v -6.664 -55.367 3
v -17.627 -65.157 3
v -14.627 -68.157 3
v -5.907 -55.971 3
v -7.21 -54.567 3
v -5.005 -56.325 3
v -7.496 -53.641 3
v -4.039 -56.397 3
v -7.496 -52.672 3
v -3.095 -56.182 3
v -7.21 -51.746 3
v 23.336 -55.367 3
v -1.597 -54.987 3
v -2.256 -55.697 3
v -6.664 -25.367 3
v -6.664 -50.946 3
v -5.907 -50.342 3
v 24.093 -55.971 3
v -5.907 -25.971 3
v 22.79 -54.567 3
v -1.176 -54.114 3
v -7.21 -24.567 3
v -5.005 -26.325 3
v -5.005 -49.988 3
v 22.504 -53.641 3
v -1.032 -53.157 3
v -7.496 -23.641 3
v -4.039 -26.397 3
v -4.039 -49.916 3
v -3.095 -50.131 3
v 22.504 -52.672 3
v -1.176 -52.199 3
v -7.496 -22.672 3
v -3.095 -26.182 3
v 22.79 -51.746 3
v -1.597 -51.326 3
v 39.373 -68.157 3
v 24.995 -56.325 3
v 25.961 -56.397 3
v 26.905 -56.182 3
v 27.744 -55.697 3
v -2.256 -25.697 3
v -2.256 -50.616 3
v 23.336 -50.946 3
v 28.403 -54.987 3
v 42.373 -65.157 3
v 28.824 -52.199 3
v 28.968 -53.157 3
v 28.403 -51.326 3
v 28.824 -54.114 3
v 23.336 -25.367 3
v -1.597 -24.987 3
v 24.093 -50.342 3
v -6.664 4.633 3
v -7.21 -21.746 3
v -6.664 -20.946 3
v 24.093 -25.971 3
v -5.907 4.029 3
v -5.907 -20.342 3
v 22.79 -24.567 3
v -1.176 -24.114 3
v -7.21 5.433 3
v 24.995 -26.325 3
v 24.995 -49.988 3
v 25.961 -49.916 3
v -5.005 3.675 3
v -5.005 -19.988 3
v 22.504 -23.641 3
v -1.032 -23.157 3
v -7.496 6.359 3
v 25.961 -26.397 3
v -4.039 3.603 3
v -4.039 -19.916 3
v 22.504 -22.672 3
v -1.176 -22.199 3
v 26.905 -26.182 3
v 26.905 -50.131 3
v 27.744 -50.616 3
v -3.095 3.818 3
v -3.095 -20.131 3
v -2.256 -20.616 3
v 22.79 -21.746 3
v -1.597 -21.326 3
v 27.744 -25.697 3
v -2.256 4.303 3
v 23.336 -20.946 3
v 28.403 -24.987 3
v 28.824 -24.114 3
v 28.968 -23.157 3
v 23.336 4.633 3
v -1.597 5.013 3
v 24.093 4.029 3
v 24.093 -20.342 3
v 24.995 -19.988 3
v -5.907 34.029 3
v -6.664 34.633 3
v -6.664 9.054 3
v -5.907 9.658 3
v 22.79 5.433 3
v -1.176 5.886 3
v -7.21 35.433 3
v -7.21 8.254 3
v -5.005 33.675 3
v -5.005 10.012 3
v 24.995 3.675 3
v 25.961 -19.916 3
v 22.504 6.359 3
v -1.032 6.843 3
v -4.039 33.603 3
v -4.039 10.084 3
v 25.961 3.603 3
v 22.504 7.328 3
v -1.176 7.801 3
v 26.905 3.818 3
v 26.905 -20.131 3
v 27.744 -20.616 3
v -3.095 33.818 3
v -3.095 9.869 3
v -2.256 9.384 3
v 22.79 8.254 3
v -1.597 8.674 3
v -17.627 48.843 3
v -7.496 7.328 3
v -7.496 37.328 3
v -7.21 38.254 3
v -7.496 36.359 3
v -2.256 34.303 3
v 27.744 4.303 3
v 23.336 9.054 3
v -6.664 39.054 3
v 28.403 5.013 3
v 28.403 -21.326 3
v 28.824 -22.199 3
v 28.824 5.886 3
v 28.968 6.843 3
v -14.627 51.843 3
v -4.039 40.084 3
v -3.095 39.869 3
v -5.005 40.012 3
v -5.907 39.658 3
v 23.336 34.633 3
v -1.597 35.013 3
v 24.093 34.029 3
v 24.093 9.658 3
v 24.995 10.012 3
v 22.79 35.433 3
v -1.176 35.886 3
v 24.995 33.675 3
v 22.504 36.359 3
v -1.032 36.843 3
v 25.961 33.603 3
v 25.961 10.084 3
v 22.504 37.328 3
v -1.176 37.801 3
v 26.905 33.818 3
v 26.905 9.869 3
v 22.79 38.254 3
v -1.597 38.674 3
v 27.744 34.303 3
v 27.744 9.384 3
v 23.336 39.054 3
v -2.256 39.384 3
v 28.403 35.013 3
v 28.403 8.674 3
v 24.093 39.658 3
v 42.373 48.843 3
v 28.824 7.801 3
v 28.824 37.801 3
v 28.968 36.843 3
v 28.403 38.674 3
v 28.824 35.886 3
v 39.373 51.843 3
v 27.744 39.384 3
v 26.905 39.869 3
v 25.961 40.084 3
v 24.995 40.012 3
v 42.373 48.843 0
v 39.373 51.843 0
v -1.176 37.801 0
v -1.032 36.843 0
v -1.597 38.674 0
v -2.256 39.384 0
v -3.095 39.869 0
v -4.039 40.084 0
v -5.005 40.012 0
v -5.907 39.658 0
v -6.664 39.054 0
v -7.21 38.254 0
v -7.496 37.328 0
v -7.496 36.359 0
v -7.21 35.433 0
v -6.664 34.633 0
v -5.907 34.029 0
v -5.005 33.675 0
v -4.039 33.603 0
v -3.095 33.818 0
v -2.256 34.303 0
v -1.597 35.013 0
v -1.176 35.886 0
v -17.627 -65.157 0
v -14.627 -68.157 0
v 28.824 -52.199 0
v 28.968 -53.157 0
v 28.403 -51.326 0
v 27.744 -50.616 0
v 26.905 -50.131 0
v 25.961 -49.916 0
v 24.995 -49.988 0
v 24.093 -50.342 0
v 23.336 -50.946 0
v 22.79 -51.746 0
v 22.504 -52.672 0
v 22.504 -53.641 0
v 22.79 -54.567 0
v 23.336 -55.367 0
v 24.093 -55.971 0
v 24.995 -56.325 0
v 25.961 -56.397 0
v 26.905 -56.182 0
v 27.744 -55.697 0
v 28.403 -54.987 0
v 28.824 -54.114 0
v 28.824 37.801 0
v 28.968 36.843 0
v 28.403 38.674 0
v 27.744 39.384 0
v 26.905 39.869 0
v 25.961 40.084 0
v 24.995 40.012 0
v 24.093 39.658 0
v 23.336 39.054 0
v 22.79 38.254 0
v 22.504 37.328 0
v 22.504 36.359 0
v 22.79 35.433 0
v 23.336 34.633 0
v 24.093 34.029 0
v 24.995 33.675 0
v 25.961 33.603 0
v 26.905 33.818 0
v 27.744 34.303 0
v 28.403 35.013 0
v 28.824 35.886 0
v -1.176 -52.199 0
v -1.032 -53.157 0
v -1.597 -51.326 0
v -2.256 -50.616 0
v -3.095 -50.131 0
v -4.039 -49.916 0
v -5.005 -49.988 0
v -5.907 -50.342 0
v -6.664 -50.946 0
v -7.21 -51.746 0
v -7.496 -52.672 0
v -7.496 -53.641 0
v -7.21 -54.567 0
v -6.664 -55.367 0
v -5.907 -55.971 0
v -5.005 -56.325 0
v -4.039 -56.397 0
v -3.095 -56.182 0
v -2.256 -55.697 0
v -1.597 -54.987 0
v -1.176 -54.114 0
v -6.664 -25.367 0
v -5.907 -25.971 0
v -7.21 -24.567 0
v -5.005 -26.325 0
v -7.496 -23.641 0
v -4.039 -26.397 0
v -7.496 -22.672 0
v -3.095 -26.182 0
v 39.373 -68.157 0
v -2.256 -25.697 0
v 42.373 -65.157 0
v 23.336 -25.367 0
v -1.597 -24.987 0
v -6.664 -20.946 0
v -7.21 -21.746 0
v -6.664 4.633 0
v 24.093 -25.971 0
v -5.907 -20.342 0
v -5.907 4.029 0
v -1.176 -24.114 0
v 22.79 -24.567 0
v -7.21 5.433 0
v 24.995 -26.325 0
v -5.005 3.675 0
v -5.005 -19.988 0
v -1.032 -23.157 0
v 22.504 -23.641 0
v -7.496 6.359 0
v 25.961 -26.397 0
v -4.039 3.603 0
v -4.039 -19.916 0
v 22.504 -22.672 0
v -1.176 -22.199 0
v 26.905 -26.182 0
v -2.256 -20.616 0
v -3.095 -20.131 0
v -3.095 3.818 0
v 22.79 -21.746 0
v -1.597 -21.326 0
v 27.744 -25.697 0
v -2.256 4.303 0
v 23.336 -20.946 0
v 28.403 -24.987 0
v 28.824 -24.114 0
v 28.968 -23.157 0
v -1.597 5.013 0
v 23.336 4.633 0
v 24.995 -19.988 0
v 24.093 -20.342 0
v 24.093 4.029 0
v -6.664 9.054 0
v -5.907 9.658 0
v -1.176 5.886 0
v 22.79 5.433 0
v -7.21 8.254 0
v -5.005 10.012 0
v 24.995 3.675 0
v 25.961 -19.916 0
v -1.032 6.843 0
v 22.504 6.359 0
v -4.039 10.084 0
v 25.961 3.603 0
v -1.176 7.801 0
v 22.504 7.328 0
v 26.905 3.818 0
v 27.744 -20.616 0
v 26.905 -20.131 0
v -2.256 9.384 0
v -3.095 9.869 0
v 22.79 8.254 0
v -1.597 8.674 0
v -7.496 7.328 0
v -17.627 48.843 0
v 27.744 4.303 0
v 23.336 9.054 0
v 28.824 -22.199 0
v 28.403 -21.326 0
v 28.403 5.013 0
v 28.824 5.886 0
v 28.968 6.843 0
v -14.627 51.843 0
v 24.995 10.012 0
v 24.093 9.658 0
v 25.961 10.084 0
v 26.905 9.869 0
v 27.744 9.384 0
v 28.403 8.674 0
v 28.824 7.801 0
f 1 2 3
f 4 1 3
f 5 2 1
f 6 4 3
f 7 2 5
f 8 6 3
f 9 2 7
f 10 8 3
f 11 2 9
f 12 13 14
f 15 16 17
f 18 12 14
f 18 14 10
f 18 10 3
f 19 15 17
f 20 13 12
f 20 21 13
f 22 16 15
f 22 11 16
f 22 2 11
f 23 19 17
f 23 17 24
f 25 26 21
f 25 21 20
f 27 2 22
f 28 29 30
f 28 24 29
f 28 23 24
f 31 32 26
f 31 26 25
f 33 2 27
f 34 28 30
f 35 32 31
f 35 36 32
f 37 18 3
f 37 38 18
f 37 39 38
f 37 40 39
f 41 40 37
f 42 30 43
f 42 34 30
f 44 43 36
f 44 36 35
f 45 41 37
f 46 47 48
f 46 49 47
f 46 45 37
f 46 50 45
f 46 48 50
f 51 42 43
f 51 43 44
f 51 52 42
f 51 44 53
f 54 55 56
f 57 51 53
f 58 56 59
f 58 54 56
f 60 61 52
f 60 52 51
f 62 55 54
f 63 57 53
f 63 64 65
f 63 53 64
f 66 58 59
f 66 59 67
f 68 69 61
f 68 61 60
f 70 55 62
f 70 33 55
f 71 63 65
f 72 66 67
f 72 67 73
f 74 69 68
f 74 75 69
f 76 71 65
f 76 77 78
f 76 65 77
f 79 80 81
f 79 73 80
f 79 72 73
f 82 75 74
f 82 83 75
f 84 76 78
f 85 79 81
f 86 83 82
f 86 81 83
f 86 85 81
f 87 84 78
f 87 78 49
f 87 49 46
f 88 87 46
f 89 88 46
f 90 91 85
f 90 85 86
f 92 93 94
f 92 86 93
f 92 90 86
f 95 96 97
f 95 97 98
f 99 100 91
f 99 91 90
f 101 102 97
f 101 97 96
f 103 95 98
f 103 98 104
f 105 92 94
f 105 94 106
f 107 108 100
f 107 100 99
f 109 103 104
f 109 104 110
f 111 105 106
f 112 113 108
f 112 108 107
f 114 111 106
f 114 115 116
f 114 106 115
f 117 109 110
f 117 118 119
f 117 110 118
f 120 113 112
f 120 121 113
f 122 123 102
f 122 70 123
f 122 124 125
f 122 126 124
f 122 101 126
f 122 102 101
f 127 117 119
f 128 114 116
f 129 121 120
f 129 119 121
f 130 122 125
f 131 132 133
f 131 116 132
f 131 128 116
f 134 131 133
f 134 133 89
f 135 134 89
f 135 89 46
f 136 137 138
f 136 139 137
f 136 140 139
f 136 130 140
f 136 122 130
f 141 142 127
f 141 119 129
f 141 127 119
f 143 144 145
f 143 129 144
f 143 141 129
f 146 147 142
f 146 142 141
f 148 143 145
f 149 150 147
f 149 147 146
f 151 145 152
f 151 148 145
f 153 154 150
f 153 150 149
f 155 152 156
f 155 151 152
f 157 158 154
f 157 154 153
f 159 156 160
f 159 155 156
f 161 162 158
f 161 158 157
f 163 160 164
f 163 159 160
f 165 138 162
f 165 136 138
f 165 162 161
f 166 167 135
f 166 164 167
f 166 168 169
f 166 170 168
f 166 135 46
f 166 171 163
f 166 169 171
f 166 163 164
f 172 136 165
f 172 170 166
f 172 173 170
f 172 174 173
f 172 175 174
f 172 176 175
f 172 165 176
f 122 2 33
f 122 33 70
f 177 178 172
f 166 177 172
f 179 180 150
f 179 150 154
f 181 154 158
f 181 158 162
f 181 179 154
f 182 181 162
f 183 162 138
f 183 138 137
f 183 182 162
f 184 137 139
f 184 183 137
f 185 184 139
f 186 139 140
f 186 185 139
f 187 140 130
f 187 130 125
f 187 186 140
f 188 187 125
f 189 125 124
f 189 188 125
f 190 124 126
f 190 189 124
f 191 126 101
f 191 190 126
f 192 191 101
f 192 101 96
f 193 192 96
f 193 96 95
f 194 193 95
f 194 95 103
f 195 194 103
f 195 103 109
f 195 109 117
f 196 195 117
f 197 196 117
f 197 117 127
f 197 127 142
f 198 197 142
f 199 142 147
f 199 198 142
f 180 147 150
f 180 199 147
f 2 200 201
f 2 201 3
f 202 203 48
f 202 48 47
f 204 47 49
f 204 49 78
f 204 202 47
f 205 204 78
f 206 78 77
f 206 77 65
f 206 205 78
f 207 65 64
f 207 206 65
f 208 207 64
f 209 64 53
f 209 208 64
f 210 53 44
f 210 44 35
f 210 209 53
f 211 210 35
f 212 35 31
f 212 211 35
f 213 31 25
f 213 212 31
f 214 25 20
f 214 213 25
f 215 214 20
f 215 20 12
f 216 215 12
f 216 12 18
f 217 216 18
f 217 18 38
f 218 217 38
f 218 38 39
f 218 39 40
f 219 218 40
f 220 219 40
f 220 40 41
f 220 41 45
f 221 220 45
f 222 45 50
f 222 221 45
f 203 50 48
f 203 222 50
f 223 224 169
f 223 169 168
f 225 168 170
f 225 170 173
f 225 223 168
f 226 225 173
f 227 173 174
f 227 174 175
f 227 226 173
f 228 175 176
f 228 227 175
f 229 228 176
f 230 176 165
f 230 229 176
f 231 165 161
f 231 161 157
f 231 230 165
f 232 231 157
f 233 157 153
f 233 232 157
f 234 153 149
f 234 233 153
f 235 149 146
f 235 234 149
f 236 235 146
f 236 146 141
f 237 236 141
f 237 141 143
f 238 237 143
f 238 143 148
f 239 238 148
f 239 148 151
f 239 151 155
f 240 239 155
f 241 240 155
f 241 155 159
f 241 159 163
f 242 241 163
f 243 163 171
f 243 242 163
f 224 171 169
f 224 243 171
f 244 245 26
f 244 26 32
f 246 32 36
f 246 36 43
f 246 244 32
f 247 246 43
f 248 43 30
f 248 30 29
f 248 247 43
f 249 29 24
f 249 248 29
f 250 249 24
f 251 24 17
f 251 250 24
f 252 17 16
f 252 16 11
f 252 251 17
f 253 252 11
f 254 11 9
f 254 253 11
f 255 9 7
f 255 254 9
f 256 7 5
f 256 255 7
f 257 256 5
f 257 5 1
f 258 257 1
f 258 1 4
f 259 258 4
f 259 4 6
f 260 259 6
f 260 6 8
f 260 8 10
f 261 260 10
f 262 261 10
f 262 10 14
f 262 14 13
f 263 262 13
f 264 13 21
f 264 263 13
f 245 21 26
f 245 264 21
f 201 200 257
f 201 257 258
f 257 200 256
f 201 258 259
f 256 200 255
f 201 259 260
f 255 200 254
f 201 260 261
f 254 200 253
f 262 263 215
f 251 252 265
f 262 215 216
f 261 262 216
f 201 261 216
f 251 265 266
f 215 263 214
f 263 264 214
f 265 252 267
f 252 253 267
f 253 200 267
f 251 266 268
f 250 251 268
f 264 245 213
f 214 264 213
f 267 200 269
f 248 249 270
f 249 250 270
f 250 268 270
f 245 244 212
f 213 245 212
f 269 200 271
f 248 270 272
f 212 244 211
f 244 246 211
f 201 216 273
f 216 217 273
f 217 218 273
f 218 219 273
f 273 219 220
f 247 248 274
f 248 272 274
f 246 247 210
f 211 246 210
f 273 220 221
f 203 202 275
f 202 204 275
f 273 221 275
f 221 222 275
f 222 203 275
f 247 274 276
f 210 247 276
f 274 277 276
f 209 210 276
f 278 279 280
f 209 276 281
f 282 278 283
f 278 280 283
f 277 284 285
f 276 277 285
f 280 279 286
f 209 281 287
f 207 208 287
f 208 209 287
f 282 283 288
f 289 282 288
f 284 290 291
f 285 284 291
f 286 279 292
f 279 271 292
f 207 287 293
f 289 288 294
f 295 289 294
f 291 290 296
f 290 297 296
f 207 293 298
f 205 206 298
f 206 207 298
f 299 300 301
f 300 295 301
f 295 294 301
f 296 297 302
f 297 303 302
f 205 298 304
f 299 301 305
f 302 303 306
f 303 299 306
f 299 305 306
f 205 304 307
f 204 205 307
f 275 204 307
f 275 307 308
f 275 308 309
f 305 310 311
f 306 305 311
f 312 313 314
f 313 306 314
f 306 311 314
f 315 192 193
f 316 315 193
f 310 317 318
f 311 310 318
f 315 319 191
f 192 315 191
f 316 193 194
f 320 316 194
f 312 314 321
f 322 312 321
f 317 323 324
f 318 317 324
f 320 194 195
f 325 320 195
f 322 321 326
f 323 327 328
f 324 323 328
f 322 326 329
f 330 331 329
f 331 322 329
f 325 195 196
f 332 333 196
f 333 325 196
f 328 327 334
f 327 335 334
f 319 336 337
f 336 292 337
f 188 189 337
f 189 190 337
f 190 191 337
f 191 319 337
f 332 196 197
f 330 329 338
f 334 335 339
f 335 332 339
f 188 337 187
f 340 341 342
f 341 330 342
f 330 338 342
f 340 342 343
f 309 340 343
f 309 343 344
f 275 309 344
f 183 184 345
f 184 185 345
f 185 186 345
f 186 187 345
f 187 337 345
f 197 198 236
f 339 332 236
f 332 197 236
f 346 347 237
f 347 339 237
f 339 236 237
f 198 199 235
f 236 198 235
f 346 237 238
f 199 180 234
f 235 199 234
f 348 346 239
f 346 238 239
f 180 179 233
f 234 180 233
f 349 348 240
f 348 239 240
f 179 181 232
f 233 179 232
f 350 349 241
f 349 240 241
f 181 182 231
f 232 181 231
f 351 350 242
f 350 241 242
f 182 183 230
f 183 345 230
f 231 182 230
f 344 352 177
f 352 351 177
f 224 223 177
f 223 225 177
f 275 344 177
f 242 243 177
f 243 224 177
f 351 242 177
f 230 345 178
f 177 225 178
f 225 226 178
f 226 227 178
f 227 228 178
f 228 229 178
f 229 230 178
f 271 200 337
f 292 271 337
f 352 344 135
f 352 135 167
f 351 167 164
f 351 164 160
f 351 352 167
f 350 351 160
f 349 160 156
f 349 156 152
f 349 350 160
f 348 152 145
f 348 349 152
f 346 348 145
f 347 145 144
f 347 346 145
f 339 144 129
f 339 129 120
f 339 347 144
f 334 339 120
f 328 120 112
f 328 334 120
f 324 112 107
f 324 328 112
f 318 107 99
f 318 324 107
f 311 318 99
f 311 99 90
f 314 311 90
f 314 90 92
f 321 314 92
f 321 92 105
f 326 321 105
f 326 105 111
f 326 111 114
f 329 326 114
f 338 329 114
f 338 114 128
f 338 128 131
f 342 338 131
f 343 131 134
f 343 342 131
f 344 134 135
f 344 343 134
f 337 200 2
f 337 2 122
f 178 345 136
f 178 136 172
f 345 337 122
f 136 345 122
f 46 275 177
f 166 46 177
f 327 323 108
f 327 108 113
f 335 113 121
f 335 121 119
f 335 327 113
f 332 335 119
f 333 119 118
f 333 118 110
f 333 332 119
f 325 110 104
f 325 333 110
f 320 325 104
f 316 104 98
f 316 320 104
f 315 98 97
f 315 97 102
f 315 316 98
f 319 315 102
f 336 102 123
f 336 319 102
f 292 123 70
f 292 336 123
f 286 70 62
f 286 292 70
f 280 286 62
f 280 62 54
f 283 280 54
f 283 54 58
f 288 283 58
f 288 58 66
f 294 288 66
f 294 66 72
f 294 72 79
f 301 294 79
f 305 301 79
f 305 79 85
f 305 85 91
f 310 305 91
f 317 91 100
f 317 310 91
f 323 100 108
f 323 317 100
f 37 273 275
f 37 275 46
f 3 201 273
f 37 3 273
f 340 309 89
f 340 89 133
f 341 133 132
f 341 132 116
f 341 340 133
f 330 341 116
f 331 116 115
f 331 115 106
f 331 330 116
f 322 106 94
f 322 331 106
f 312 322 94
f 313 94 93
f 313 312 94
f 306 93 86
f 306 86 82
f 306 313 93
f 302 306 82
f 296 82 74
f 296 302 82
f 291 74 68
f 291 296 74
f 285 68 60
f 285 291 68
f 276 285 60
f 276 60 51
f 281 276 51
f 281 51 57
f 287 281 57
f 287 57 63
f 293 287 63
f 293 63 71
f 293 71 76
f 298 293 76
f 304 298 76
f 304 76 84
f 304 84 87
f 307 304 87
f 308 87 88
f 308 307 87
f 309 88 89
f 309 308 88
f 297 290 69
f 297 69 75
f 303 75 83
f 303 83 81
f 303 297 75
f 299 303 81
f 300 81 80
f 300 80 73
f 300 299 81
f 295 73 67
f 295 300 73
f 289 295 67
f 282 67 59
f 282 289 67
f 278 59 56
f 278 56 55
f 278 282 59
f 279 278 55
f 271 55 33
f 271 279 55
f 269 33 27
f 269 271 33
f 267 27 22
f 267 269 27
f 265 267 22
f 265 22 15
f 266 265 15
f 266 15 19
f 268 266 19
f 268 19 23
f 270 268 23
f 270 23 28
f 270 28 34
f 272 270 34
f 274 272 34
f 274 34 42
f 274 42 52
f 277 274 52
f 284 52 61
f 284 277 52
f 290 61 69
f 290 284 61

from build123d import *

# Parameters (mm, degrees)
SKETCH1_W           = 60
SKETCH1_H           = 120
SKETCH1_R           = 3.25
BOSS_EXTRUDE1_DEPTH = 3
CHAMFER1_SIZE       = 3


with BuildPart() as part:
    # Sketch1 → Boss-Extrude1 (new body)
    with BuildSketch(Plane.XY):
        with Locations((12.372881356, -8.156527448)):
            Rectangle(SKETCH1_W, SKETCH1_H)
        with Locations((-4.281987853, 36.843472552)):
            Circle(SKETCH1_R, mode=Mode.SUBTRACT)
        with Locations((25.718012147, 36.843472552)):
            Circle(SKETCH1_R, mode=Mode.SUBTRACT)
        with Locations((-4.281987853, 6.843472552)):
            Circle(SKETCH1_R, mode=Mode.SUBTRACT)
        with Locations((25.718012147, 6.843472552)):
            Circle(SKETCH1_R, mode=Mode.SUBTRACT)
        with Locations((-4.281987853, -23.156527448)):
            Circle(SKETCH1_R, mode=Mode.SUBTRACT)
        with Locations((25.718012147, -23.156527448)):
            Circle(SKETCH1_R, mode=Mode.SUBTRACT)
        with Locations((-4.281987853, -53.156527448)):
            Circle(SKETCH1_R, mode=Mode.SUBTRACT)
        with Locations((25.718012147, -53.156527448)):
            Circle(SKETCH1_R, mode=Mode.SUBTRACT)
    extrude(amount=BOSS_EXTRUDE1_DEPTH)

    # Chamfer1
    chamfer1_edges = [part.edges().sort_by_distance(p)[0] for p in [
        (-17.627118644, 51.843472552, 1.5),
        (42.372881356, 51.843472552, 1.5),
        (42.372881356, -68.156527448, 1.5),
        (-17.627118644, -68.156527448, 1.5),
    ]]
    chamfer(chamfer1_edges, length=CHAMFER1_SIZE)


solid = part.part
